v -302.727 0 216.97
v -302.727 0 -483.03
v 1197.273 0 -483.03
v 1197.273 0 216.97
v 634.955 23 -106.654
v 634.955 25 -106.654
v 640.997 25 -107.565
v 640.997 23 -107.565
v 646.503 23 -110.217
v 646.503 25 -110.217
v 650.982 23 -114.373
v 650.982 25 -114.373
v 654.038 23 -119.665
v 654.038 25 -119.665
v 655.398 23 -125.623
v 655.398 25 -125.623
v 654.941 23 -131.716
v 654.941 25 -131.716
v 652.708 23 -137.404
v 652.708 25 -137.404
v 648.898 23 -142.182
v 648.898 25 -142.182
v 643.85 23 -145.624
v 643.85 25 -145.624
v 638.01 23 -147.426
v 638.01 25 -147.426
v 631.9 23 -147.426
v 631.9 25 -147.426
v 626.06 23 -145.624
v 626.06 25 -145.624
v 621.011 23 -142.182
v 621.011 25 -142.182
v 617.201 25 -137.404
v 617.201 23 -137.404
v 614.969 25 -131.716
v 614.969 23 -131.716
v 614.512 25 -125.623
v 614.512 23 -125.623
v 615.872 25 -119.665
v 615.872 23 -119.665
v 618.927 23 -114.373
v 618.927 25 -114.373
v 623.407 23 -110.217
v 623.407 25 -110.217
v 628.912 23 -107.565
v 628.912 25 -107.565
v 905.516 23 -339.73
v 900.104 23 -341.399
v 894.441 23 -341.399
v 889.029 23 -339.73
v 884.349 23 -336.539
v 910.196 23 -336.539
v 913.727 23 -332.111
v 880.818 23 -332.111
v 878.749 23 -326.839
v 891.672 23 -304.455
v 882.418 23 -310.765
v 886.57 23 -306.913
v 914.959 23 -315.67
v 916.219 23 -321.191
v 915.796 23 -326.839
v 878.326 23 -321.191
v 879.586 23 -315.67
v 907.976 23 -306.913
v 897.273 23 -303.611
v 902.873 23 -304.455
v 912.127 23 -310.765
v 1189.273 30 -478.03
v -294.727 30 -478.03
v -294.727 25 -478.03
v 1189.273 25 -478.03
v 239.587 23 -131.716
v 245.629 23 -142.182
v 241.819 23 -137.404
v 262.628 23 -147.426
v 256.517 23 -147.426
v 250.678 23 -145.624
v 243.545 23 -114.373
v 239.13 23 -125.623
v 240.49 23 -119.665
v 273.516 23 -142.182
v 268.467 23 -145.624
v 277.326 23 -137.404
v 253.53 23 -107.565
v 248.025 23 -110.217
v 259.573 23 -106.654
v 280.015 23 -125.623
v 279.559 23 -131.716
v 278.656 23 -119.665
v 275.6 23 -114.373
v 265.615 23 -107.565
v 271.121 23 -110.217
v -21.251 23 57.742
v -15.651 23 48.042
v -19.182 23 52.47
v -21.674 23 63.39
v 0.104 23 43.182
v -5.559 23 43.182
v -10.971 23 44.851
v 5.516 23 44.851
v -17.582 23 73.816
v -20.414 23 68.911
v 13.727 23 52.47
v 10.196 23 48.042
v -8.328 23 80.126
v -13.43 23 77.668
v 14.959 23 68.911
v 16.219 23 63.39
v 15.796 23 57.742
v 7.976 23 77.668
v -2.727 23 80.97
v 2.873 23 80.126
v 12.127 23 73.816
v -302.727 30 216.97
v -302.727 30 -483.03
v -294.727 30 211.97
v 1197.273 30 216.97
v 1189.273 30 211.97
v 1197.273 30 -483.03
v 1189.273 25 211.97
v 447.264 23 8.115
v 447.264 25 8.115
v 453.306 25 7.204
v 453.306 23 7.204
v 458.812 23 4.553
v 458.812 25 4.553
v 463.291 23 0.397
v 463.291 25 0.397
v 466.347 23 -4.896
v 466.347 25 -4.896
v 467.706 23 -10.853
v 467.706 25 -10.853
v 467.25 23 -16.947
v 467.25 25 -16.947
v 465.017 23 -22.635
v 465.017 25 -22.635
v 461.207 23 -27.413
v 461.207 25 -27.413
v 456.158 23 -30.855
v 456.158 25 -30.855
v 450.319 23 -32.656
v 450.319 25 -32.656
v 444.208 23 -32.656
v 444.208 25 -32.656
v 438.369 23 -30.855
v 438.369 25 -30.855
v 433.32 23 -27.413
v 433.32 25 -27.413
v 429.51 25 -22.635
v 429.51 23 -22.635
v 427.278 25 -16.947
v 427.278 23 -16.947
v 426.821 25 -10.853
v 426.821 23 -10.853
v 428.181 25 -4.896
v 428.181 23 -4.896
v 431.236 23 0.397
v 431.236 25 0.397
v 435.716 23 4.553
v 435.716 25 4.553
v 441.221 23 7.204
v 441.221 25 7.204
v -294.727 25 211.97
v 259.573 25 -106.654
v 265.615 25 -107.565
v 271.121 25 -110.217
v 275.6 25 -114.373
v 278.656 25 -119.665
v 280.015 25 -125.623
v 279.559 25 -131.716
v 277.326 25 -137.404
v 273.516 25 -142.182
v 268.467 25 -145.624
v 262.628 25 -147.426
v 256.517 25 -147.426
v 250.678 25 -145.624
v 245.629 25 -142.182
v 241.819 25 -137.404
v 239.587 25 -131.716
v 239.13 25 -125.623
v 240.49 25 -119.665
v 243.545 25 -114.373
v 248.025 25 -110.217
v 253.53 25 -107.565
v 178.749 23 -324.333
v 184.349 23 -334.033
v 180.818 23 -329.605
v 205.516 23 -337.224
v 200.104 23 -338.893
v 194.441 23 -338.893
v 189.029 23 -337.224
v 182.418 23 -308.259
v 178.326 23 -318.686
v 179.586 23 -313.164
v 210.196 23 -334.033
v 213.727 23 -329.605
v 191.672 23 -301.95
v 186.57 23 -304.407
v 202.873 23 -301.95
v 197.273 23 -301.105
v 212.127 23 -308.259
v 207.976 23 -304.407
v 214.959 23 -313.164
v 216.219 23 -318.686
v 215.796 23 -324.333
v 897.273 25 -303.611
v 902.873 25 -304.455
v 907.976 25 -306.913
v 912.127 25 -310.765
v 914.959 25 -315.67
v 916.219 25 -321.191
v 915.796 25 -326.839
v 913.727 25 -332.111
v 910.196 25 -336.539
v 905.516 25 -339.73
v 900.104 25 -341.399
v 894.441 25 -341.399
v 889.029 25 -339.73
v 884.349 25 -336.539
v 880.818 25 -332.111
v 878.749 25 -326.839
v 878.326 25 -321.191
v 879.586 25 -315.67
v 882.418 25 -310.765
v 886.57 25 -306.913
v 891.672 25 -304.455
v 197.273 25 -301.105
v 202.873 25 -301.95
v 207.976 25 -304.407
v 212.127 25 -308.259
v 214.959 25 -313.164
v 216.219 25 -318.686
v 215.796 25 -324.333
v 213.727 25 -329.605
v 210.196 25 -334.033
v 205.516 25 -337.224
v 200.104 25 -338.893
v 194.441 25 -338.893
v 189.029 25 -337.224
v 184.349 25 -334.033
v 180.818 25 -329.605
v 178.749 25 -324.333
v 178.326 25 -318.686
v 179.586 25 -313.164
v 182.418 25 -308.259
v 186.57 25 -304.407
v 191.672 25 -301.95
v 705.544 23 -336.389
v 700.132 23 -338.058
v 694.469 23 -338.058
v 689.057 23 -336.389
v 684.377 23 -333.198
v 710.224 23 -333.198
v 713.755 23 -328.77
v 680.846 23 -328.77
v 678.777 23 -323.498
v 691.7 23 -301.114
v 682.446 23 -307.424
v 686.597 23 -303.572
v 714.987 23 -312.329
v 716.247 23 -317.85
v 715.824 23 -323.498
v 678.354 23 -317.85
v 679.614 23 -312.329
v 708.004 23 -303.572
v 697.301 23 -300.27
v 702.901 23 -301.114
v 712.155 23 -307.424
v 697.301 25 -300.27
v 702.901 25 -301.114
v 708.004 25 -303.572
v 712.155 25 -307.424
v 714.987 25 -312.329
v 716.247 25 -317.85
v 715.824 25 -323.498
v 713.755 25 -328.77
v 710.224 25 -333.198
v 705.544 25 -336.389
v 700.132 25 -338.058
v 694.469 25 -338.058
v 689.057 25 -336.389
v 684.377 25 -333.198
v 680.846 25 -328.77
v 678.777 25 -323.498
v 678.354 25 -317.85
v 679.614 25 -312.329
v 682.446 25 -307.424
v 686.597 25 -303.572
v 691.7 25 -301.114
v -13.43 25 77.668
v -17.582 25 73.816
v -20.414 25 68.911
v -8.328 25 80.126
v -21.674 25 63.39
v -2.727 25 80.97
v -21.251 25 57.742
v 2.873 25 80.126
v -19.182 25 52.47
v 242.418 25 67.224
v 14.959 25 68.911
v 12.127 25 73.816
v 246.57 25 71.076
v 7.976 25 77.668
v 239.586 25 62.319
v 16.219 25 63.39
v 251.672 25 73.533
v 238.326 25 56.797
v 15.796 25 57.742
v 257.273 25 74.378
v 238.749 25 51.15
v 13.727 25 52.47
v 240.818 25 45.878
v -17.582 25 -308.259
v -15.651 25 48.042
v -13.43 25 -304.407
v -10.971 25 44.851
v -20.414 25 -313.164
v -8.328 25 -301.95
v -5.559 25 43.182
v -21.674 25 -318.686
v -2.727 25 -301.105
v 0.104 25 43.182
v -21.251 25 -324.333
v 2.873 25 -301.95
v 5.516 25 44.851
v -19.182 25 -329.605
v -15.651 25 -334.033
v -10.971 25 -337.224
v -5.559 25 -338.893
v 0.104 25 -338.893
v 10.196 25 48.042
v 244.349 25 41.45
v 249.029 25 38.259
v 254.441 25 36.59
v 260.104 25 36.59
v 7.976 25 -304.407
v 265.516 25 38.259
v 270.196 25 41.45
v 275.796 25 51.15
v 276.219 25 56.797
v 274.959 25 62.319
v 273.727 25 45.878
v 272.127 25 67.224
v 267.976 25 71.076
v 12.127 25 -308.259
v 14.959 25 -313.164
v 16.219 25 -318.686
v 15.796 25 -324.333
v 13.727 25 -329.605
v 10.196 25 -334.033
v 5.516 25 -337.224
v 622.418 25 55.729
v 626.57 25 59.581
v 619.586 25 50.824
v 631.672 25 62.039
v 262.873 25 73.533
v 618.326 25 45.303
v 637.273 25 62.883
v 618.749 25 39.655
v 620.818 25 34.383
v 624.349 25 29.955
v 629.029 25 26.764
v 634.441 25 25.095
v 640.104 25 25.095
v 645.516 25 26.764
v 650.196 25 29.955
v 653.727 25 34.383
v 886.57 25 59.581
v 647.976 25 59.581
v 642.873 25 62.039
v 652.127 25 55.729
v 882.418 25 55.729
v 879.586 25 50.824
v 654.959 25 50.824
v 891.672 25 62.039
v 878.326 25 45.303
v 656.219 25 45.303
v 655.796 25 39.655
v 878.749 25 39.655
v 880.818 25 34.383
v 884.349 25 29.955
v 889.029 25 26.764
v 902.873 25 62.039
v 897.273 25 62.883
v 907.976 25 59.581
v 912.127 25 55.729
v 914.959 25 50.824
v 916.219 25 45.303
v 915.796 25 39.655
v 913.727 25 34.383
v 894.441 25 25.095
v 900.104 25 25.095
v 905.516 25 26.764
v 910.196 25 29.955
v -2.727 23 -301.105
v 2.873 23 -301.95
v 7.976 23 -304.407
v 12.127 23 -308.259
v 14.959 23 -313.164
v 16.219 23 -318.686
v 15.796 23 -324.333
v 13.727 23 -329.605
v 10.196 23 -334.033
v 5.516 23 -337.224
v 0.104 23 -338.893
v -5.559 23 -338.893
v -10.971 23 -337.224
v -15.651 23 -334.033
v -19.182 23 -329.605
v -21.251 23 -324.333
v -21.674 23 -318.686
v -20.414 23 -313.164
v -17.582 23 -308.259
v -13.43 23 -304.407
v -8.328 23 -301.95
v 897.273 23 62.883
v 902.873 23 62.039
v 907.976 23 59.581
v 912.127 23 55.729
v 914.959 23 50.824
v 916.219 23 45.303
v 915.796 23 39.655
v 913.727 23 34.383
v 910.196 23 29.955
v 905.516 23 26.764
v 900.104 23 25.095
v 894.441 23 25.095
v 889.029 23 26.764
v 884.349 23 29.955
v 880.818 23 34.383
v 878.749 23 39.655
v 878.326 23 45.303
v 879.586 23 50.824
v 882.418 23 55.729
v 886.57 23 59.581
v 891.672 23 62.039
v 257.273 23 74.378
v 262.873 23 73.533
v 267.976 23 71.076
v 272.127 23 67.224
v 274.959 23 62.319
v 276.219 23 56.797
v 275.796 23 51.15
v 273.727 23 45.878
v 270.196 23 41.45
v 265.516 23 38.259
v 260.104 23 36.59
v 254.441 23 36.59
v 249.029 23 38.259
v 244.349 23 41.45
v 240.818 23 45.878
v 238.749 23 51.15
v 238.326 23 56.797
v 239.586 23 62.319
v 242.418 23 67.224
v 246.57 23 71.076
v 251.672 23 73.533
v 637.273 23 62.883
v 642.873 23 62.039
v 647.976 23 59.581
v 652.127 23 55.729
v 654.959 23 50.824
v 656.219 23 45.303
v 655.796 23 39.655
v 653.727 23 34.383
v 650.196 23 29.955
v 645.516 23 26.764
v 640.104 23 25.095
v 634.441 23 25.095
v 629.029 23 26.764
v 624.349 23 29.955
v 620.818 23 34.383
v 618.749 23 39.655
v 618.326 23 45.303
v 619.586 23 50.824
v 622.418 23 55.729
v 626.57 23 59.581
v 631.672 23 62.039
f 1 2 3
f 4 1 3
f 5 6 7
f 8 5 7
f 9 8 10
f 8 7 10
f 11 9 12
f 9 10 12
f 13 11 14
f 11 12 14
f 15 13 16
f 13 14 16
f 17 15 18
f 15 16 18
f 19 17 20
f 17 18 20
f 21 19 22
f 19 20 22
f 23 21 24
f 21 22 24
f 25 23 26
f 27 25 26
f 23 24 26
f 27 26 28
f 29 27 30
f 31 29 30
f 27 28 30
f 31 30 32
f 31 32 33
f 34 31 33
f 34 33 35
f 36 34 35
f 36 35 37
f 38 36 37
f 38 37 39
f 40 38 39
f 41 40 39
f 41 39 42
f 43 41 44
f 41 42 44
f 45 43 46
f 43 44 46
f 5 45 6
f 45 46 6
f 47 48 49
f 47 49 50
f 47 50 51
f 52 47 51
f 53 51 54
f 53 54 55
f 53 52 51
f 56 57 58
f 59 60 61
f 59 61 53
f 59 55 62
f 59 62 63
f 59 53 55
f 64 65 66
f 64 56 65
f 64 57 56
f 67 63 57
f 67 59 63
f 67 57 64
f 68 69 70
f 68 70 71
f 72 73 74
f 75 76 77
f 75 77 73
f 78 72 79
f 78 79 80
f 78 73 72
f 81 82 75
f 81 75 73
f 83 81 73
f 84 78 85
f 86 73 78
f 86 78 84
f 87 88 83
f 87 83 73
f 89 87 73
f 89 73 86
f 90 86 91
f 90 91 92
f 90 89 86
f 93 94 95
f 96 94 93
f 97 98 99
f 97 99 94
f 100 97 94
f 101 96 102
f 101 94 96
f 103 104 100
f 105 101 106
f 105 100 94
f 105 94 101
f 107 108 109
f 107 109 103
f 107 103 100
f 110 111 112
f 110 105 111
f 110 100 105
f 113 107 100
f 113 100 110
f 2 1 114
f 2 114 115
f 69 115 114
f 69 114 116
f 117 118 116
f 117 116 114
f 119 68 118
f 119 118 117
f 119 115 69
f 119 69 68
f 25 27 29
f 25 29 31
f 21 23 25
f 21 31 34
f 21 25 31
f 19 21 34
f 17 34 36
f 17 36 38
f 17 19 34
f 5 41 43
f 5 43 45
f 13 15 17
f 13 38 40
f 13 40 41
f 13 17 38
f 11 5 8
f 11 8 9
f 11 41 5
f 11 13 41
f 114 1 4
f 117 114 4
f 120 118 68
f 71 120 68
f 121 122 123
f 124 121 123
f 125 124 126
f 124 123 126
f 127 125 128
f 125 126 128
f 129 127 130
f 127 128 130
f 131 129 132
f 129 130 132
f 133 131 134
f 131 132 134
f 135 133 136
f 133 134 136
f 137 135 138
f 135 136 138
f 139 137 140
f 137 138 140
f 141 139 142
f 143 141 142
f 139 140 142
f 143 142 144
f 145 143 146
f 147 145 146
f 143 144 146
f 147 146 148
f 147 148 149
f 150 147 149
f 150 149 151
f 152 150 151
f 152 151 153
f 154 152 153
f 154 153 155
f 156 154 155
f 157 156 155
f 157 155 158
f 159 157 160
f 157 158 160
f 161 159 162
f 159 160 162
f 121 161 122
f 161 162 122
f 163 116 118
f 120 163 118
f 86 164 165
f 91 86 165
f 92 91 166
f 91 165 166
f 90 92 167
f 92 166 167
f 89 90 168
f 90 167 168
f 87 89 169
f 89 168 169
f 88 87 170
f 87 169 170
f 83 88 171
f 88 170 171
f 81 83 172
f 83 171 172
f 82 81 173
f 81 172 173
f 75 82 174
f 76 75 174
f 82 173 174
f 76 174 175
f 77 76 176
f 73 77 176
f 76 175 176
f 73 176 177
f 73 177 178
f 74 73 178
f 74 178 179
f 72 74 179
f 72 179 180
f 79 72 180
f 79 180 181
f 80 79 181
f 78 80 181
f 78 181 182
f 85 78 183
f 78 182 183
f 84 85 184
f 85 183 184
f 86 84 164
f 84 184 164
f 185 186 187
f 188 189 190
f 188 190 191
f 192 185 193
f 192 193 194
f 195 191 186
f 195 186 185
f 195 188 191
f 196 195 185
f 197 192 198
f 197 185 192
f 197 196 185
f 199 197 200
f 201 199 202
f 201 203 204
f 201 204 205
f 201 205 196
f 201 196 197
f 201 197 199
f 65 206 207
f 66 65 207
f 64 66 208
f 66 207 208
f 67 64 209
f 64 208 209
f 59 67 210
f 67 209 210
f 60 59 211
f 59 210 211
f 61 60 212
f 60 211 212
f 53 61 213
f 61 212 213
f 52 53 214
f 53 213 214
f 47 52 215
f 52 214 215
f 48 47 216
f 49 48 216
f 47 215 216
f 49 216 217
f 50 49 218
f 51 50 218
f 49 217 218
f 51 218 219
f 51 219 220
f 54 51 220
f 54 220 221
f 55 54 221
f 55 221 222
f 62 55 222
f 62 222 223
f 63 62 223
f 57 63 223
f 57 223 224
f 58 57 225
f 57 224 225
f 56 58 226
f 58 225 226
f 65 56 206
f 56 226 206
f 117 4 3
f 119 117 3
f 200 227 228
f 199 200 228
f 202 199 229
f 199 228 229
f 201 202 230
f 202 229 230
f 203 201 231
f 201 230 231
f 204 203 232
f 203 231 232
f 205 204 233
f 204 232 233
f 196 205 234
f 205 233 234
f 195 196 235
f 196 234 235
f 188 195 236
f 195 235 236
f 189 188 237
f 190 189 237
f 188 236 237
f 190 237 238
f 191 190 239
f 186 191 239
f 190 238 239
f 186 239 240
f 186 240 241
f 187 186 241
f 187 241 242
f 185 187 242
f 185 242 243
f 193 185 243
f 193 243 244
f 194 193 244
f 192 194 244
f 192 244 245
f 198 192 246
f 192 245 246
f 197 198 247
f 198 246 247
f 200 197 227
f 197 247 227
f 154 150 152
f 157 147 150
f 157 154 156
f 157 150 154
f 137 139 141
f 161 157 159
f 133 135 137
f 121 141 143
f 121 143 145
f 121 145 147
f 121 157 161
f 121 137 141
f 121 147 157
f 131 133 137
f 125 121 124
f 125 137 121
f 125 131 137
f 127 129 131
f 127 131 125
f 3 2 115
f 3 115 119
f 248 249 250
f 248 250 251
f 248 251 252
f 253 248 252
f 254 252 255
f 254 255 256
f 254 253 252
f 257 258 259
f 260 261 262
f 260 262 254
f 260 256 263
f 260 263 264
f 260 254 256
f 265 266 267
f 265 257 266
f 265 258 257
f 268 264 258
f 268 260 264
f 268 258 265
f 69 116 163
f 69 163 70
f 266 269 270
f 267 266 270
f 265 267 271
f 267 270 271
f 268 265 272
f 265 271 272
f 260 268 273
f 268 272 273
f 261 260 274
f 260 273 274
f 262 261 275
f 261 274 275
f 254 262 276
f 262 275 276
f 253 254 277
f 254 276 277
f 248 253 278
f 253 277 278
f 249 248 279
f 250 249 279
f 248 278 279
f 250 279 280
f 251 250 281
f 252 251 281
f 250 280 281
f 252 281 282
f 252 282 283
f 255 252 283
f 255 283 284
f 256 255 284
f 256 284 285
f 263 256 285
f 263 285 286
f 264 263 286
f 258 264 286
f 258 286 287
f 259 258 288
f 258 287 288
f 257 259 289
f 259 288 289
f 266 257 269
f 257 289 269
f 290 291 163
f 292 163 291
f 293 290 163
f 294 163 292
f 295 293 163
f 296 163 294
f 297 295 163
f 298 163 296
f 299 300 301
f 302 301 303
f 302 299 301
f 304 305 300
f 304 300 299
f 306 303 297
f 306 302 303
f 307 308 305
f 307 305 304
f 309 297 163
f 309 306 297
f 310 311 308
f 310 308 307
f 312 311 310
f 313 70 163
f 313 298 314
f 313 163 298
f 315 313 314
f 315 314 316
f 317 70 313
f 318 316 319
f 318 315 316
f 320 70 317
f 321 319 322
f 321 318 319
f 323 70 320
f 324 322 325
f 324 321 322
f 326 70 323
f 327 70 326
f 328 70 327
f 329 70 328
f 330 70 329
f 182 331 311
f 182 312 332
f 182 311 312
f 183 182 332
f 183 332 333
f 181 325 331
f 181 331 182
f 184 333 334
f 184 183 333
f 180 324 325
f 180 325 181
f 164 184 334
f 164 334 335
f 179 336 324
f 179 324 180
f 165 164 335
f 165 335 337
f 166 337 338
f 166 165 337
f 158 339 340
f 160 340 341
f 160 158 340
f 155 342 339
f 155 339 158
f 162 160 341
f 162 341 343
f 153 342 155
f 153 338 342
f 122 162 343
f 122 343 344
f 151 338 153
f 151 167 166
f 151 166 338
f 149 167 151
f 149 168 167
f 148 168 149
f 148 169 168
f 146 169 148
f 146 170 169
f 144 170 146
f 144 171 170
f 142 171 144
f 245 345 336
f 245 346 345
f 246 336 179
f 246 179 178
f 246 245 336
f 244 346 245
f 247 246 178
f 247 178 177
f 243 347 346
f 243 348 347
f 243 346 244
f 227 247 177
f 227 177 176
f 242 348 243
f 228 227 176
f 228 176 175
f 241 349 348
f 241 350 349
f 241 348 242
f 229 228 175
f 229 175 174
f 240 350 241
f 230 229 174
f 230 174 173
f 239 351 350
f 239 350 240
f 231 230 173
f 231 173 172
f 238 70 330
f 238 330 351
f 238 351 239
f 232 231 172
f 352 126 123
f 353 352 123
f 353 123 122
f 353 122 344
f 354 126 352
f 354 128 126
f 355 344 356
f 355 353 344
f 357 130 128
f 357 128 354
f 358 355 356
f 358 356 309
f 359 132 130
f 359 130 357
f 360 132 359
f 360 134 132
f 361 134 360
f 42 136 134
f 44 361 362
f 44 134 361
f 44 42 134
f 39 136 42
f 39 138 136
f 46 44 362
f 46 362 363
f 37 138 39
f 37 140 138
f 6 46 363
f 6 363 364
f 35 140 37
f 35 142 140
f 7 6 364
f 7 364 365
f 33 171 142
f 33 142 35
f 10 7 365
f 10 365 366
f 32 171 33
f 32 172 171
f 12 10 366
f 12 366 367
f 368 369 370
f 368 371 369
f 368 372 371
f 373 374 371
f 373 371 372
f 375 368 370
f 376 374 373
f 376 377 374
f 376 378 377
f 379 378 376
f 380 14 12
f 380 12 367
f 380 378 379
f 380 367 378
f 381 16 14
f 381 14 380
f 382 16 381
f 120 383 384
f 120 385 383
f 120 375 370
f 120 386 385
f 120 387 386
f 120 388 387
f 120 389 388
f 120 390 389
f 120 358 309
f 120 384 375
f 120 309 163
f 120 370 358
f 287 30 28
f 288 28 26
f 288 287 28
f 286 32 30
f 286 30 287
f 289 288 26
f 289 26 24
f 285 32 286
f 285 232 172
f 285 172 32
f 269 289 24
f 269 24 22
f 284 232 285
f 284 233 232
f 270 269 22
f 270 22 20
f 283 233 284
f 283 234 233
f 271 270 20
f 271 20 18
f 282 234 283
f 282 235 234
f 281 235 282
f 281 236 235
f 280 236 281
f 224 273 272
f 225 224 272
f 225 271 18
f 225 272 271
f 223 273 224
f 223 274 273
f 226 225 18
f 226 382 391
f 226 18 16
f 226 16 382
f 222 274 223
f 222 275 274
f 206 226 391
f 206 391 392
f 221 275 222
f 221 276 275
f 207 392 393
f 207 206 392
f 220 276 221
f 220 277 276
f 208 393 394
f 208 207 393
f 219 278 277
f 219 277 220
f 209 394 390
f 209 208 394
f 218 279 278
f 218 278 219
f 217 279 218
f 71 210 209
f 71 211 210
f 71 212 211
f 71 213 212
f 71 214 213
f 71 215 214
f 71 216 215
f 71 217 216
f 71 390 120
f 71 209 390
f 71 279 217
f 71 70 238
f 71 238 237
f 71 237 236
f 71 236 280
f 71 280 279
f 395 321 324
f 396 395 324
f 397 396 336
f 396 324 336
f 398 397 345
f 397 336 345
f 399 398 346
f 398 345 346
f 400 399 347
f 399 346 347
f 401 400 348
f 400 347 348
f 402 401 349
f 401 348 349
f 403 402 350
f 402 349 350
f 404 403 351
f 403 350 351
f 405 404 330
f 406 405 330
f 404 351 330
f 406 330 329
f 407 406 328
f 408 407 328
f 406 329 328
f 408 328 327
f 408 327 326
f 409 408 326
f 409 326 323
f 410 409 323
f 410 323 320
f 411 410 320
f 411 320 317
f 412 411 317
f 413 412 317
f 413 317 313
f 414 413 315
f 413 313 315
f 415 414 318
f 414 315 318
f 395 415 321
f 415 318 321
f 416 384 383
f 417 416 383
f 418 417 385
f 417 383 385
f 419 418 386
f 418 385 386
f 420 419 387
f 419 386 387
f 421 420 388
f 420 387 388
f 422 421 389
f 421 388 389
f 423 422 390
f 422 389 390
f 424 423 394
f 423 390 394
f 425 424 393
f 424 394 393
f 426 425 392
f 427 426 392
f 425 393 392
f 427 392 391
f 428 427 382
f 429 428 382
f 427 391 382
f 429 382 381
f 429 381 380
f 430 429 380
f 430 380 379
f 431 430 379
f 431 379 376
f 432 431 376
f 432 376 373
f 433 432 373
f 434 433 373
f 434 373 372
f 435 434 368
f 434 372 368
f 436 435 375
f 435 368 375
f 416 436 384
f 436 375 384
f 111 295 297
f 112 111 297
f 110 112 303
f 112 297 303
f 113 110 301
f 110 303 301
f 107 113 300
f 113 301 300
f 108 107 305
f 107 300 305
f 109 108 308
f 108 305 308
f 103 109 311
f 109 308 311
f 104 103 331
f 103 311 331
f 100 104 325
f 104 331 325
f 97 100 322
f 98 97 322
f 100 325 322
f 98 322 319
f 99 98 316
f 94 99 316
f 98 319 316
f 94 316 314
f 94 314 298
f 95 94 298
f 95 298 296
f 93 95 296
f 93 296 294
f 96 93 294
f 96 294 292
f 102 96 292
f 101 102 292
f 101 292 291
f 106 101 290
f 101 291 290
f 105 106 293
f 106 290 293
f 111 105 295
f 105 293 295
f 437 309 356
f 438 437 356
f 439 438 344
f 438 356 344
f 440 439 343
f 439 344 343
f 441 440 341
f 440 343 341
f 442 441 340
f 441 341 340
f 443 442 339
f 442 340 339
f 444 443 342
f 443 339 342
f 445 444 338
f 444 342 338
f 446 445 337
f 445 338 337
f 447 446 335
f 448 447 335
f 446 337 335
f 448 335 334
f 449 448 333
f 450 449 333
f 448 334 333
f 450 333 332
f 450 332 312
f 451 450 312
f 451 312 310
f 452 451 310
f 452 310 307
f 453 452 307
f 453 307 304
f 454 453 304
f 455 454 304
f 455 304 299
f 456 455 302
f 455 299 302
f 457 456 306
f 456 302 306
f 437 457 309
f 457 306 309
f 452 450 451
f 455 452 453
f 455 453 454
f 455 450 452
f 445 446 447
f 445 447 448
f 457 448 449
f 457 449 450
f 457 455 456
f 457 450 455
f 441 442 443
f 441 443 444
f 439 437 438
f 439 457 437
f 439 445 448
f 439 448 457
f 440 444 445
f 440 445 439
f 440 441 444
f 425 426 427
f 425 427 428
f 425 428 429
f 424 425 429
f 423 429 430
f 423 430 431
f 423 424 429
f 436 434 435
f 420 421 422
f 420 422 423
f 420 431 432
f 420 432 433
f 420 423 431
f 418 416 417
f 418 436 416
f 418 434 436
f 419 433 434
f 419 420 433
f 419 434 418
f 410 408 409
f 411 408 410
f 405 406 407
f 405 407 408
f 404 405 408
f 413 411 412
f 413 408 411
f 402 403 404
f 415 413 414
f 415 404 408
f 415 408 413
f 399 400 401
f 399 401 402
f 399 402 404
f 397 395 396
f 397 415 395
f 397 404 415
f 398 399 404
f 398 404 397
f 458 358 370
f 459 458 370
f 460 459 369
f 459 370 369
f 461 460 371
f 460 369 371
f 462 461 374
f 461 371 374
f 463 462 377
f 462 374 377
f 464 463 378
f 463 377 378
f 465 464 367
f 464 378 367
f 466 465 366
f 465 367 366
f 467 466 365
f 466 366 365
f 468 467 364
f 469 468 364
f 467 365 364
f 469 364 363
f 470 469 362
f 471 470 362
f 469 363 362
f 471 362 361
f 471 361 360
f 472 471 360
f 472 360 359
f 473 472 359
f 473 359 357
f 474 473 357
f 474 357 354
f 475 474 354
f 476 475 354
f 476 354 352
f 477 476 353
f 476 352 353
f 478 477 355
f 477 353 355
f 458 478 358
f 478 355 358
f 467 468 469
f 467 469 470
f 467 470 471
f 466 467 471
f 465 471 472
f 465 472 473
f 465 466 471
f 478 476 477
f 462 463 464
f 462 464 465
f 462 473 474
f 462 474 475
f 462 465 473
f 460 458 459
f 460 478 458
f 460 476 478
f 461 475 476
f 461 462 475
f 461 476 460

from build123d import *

# Parameters (mm, degrees)
SKETCH2_W           = 1500
SKETCH2_H           = 700
BOSS_EXTRUDE1_DEPTH = 30
SKETCH3_W           = 1484
SKETCH3_H           = 690
CUT_EXTRUDE2_DEPTH  = 5
SKETCH9_R           = 19
SKETCH9_R_2         = 20.5
CUT_EXTRUDE3_DEPTH  = 2


with BuildPart() as part:
    # Sketch2 → Boss-Extrude1 (new body)
    with BuildSketch(Plane(origin=(0, 0, 0), x_dir=(1, 0, 0), z_dir=(0, 1, 0))):
        with Locations((447.272601934, 133.030337178)):
            Rectangle(SKETCH2_W, SKETCH2_H)
    extrude(amount=BOSS_EXTRUDE1_DEPTH)

    # Sketch3 → Cut-Extrude2 (cut)
    with BuildSketch(Plane(origin=(0, 30, 0), x_dir=(1, 0, 0), z_dir=(0, 1, 0))):
        with Locations((447.272601934, 133.030337178)):
            Rectangle(SKETCH3_W, SKETCH3_H)
    extrude(amount=-CUT_EXTRUDE2_DEPTH, mode=Mode.SUBTRACT)

    # Sketch9 → Cut-Extrude3 (cut)
    with BuildSketch(Plane(origin=(0, 25, 0), x_dir=(1, 0, 0), z_dir=(0, 1, 0))):
        with Locations(Location((197.272601934, 320.105430206, 0), (0, 0, 270))):
            Circle(SKETCH9_R)
        with Locations(Location((697.300508301, 319.270199385, 0), (0, 0, 270))):
            Circle(SKETCH9_R)
        with Locations(Location((257.272601934, -55.377603043, 0), (0, 0, 270))):
            Circle(SKETCH9_R)
        with Locations(Location((637.272601934, -43.882638763, 0), (0, 0, 270))):
            Circle(SKETCH9_R)
        with Locations(Location((259.572601934, 127.154489334, 0), (0, 0, 270))):
            Circle(SKETCH9_R_2)
        with Locations(Location((634.954920993, 127.154489334, 0), (0, 0, 270))):
            Circle(SKETCH9_R_2)
        with Locations(Location((447.263761463, 12.385030703, 0), (0, 0, 270))):
            Circle(SKETCH9_R_2)
        with Locations(Location((-2.727398066, 320.105430206, 0), (0, 0, 270))):
            Circle(SKETCH9_R)
        with Locations(Location((-2.727398066, -61.969662822, 0), (0, 0, 270))):
            Circle(SKETCH9_R)
        with Locations(Location((897.272601934, 322.611122669, 0), (0, 0, 270))):
            Circle(SKETCH9_R)
        with Locations(Location((897.272601934, -43.882638763, 0), (0, 0, 270))):
            Circle(SKETCH9_R)
    extrude(amount=-CUT_EXTRUDE3_DEPTH, mode=Mode.SUBTRACT)


solid = part.part
